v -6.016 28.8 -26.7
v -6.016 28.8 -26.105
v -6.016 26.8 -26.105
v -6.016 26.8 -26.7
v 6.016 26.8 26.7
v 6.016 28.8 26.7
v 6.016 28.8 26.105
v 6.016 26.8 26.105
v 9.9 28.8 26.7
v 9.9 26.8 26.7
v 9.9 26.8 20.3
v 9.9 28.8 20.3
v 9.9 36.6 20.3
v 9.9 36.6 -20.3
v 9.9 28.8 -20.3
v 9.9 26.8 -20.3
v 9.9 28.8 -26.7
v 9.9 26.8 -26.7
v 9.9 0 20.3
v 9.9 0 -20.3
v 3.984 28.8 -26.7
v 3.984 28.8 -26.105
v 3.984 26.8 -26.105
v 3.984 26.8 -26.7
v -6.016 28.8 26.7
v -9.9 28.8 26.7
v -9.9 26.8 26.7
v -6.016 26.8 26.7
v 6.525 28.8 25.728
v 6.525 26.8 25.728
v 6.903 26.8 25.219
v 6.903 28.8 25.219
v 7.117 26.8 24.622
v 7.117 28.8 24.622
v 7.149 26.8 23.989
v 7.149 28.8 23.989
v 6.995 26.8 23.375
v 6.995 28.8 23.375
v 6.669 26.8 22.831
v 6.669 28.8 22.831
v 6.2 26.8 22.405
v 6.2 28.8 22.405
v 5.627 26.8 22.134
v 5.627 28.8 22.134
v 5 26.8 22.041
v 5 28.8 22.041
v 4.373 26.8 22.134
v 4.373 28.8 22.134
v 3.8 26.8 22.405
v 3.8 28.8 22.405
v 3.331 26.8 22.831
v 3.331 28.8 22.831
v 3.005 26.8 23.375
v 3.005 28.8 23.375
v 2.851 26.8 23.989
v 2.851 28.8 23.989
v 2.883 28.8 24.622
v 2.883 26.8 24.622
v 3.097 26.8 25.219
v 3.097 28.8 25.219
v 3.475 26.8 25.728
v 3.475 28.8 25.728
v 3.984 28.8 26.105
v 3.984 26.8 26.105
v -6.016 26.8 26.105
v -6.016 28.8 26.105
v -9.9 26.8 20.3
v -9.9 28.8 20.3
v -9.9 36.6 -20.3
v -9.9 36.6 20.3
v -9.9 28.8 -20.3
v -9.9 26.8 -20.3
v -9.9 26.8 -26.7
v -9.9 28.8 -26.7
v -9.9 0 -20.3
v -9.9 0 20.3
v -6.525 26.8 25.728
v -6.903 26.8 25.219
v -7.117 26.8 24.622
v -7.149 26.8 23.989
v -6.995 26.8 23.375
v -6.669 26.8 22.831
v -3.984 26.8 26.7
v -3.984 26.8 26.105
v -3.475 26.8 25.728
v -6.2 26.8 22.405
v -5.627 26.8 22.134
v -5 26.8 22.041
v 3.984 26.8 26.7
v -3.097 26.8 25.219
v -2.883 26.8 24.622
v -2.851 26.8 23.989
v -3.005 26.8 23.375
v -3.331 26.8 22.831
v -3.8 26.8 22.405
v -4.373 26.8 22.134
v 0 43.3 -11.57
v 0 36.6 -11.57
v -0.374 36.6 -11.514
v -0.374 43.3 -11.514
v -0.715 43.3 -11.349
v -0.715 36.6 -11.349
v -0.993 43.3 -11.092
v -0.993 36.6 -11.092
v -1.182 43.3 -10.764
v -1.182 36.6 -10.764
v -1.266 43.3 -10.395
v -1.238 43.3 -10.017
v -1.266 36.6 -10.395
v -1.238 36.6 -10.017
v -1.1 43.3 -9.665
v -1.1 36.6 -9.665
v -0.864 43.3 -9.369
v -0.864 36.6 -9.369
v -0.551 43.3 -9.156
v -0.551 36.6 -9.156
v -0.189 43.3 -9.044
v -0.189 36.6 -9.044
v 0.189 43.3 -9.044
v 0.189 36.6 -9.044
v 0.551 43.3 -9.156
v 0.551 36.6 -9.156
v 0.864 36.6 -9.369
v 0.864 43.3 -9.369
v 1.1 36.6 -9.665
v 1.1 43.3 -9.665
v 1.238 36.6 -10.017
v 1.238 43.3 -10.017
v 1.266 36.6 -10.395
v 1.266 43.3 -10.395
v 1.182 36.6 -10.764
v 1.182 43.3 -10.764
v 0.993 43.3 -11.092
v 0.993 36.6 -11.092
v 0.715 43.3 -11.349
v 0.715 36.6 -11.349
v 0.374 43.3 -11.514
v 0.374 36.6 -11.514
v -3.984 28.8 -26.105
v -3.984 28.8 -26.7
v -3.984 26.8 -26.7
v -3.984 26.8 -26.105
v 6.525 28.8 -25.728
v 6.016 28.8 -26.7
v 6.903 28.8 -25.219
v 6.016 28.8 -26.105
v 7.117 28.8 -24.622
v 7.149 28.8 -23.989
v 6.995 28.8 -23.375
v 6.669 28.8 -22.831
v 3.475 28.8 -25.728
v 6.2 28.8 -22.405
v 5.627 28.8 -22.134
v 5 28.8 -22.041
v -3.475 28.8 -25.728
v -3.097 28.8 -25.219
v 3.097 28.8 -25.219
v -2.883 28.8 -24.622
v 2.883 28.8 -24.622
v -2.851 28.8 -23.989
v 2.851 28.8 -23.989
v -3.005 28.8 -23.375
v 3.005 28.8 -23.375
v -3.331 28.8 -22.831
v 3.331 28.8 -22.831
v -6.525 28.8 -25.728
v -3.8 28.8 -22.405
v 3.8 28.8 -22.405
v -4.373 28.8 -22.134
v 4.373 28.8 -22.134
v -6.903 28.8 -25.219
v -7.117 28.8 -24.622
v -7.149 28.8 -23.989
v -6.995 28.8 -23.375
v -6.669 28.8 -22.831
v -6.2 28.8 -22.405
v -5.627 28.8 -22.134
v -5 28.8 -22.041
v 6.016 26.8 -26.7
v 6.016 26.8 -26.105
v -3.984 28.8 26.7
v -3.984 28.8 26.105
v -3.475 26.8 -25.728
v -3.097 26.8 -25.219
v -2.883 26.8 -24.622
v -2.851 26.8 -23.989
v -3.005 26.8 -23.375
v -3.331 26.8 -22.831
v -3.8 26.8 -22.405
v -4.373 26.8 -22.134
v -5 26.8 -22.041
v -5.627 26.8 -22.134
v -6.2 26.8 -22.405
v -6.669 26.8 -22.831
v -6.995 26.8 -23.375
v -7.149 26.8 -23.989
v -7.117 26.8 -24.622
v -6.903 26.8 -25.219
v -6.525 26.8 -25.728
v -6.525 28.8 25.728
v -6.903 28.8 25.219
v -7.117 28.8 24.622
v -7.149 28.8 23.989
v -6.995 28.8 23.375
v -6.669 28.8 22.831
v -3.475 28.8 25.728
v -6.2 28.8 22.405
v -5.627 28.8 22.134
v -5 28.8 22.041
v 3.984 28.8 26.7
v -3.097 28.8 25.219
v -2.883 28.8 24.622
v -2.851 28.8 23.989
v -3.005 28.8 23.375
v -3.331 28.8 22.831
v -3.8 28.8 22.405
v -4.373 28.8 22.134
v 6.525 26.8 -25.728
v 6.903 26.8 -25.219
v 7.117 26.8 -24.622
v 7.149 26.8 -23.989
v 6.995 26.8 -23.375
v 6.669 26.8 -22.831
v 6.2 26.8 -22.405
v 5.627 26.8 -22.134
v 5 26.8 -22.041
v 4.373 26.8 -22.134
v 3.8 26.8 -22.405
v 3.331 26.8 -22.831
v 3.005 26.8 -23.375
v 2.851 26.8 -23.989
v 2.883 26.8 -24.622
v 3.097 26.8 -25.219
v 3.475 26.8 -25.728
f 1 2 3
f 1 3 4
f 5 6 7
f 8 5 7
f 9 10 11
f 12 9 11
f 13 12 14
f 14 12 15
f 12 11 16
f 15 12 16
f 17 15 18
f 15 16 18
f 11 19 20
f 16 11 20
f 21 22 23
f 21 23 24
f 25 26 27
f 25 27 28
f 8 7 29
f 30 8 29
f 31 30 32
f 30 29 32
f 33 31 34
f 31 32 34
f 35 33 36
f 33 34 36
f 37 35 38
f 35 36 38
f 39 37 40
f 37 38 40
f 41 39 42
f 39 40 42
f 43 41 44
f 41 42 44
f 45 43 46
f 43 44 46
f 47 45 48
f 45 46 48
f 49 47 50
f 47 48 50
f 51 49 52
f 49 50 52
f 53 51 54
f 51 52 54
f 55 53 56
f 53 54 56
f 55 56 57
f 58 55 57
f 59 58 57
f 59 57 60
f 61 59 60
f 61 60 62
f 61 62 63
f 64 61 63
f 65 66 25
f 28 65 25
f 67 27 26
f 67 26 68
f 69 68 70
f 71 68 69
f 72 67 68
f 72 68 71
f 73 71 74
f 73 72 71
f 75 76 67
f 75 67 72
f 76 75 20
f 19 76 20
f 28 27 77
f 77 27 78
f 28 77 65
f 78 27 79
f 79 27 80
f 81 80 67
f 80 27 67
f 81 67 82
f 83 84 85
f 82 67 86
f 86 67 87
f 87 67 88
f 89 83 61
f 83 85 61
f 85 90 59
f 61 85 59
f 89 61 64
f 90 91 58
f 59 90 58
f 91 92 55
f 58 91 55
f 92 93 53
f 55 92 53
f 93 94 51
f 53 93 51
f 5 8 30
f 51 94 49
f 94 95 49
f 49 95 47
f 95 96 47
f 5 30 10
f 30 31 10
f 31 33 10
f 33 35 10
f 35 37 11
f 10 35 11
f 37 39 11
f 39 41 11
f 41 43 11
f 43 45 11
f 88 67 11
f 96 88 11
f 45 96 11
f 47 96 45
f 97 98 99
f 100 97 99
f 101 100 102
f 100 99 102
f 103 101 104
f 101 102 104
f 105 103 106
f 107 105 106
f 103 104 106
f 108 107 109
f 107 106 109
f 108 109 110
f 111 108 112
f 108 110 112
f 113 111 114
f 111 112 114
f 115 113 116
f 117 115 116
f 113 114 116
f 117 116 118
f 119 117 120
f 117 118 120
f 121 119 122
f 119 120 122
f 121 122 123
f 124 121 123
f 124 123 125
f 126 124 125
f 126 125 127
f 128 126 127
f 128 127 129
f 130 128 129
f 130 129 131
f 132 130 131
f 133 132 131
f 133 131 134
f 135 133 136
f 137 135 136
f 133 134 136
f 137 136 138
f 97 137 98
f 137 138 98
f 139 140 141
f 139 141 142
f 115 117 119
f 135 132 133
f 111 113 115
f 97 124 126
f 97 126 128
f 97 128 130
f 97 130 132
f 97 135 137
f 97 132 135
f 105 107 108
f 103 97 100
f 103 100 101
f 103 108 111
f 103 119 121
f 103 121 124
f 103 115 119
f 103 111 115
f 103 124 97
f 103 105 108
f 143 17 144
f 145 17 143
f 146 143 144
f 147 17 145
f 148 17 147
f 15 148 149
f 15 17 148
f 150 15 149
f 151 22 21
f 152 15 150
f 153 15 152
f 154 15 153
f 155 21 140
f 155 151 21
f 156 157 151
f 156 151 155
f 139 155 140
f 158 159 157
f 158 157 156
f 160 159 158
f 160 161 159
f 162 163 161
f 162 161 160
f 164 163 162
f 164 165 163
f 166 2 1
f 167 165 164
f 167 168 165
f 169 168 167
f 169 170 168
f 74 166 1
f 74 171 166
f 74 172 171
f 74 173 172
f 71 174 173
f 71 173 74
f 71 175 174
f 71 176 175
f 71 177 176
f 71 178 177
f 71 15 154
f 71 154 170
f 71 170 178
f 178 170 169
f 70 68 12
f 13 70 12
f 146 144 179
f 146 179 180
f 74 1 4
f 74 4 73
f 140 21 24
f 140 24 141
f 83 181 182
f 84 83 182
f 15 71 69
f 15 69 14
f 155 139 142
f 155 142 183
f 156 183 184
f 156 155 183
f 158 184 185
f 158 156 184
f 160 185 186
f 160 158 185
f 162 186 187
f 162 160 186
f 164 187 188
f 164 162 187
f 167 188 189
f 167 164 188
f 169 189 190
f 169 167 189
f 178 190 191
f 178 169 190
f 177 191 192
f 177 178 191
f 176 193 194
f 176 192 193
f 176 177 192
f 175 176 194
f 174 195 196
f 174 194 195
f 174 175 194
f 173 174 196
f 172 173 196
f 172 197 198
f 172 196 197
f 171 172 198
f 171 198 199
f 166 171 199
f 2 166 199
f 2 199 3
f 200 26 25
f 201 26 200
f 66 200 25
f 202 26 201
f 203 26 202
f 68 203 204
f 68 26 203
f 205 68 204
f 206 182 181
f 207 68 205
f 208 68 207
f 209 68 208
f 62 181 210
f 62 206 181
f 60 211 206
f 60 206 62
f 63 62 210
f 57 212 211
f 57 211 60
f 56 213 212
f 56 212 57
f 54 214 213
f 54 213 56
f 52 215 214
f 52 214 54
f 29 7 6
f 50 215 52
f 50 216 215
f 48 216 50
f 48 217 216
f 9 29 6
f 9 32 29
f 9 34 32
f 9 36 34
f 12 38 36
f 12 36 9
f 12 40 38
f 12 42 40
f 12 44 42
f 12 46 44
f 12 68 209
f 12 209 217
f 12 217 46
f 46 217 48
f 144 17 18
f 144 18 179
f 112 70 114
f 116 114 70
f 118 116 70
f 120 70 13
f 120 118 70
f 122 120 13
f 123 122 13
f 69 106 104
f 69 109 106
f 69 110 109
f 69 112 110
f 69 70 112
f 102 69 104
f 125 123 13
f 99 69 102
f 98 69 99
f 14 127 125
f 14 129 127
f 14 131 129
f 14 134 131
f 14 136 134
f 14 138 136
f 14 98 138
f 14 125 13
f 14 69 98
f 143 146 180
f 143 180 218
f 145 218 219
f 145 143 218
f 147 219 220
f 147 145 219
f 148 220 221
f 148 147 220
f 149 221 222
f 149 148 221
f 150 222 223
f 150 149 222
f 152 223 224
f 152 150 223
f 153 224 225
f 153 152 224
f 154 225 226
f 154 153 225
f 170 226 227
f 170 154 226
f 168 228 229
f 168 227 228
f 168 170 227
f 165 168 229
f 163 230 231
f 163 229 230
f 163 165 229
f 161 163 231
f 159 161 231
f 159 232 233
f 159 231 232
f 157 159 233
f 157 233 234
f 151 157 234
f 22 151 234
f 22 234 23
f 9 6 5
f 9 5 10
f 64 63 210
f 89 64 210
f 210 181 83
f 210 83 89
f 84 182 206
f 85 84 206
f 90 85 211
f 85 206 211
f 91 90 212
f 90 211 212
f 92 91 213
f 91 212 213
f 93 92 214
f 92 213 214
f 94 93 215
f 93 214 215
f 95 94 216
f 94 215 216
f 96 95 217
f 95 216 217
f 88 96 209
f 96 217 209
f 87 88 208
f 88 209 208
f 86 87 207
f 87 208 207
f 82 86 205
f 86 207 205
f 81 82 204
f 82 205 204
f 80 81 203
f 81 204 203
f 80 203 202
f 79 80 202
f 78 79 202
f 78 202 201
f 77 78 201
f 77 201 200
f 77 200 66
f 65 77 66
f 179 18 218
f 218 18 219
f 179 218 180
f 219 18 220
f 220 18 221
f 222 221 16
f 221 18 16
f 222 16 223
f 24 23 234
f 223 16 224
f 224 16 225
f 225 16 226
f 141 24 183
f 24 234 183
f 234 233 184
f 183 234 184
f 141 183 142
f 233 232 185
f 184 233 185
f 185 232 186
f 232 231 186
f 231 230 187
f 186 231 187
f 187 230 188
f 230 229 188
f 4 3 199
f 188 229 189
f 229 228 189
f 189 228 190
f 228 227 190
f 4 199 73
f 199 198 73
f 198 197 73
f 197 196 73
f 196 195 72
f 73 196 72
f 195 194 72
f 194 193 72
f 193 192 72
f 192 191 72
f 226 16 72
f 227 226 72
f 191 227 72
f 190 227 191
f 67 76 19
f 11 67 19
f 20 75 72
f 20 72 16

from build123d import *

# Parameters (mm, degrees)
SKETCH1_W           = 19.8
SKETCH1_H           = 40.6
BOSS_EXTRUDE1_DEPTH = 36.6
SKETCH2_R           = 1.27
BOSS_EXTRUDE2_DEPTH = 6.700000022
SKETCH3_W           = 19.8
SKETCH3_H           = 2
BOSS_EXTRUDE3_DEPTH = 6.4
SKETCH4_W           = 19.8
SKETCH4_H           = 2
BOSS_EXTRUDE4_DEPTH = 6.4
CUT_EXTRUDE1_DEPTH  = 47.37305252


with BuildPart() as part:
    # Sketch1 → Boss-Extrude1 (new body)
    with BuildSketch(Plane(origin=(0, 0, 0), x_dir=(1, 0, 0), z_dir=(0, 1, 0))):
        Rectangle(SKETCH1_W, SKETCH1_H)
    extrude(amount=BOSS_EXTRUDE1_DEPTH)

    # Sketch2 → Boss-Extrude2 (add)
    with BuildSketch(Plane(origin=(0, 36.6, 0), x_dir=(1, 0, 0), z_dir=(0, 1, 0))):
        with Locations(Location((0, 10.3, 0), (0, 0, 90))):
            Circle(SKETCH2_R)
    extrude(amount=BOSS_EXTRUDE2_DEPTH)

    # Sketch3 → Boss-Extrude3 (add)
    with BuildSketch(Plane(origin=(0, 0, -20.3), x_dir=(-1, 0, 0), z_dir=(0, 0, -1))):
        with Locations((0, 27.8)):
            Rectangle(SKETCH3_W, SKETCH3_H)
    extrude(amount=BOSS_EXTRUDE3_DEPTH)

    # Sketch4 → Boss-Extrude4 (add)
    with BuildSketch(Plane.XY.offset(20.3)):
        with Locations((0, 27.8)):
            Rectangle(SKETCH4_W, SKETCH4_H)
    extrude(amount=BOSS_EXTRUDE4_DEPTH)

    # Sketch5 → Cut-Extrude1 (cut, through all)
    with BuildSketch(Plane(origin=(0, 36.6, 0), x_dir=(1, 0, 0), z_dir=(0, 1, 0))):
        with BuildLine():
            Line((-6.016, 26.105), (-6.016, 26.7))
            Line((-6.016, 26.7), (-3.984, 26.7))
            Line((-3.984, 26.7), (-3.984, 26.105))
            ThreePointArc((-3.984, 26.105), (-5, 22.041), (-6.016, 26.105))
        make_face()
        with BuildLine():
            Line((3.984, 26.105), (3.984, 26.7))
            Line((3.984, 26.7), (6.016, 26.7))
            Line((6.016, 26.7), (6.016, 26.105))
            ThreePointArc((6.016, 26.105), (5, 22.041), (3.984, 26.105))
        make_face()
        with BuildLine():
            Line((-6.016, -26.105), (-6.016, -26.7))
            Line((-6.016, -26.7), (-3.984, -26.7))
            Line((-3.984, -26.7), (-3.984, -26.105))
            ThreePointArc((-3.984, -26.105), (-5, -22.041), (-6.016, -26.105))
        make_face()
        with BuildLine():
            Line((3.984, -26.105), (3.984, -26.7))
            Line((3.984, -26.7), (6.016, -26.7))
            Line((6.016, -26.7), (6.016, -26.105))
            ThreePointArc((6.016, -26.105), (5, -22.041), (3.984, -26.105))
        make_face()
    extrude(amount=-CUT_EXTRUDE1_DEPTH, mode=Mode.SUBTRACT)


solid = part.part
